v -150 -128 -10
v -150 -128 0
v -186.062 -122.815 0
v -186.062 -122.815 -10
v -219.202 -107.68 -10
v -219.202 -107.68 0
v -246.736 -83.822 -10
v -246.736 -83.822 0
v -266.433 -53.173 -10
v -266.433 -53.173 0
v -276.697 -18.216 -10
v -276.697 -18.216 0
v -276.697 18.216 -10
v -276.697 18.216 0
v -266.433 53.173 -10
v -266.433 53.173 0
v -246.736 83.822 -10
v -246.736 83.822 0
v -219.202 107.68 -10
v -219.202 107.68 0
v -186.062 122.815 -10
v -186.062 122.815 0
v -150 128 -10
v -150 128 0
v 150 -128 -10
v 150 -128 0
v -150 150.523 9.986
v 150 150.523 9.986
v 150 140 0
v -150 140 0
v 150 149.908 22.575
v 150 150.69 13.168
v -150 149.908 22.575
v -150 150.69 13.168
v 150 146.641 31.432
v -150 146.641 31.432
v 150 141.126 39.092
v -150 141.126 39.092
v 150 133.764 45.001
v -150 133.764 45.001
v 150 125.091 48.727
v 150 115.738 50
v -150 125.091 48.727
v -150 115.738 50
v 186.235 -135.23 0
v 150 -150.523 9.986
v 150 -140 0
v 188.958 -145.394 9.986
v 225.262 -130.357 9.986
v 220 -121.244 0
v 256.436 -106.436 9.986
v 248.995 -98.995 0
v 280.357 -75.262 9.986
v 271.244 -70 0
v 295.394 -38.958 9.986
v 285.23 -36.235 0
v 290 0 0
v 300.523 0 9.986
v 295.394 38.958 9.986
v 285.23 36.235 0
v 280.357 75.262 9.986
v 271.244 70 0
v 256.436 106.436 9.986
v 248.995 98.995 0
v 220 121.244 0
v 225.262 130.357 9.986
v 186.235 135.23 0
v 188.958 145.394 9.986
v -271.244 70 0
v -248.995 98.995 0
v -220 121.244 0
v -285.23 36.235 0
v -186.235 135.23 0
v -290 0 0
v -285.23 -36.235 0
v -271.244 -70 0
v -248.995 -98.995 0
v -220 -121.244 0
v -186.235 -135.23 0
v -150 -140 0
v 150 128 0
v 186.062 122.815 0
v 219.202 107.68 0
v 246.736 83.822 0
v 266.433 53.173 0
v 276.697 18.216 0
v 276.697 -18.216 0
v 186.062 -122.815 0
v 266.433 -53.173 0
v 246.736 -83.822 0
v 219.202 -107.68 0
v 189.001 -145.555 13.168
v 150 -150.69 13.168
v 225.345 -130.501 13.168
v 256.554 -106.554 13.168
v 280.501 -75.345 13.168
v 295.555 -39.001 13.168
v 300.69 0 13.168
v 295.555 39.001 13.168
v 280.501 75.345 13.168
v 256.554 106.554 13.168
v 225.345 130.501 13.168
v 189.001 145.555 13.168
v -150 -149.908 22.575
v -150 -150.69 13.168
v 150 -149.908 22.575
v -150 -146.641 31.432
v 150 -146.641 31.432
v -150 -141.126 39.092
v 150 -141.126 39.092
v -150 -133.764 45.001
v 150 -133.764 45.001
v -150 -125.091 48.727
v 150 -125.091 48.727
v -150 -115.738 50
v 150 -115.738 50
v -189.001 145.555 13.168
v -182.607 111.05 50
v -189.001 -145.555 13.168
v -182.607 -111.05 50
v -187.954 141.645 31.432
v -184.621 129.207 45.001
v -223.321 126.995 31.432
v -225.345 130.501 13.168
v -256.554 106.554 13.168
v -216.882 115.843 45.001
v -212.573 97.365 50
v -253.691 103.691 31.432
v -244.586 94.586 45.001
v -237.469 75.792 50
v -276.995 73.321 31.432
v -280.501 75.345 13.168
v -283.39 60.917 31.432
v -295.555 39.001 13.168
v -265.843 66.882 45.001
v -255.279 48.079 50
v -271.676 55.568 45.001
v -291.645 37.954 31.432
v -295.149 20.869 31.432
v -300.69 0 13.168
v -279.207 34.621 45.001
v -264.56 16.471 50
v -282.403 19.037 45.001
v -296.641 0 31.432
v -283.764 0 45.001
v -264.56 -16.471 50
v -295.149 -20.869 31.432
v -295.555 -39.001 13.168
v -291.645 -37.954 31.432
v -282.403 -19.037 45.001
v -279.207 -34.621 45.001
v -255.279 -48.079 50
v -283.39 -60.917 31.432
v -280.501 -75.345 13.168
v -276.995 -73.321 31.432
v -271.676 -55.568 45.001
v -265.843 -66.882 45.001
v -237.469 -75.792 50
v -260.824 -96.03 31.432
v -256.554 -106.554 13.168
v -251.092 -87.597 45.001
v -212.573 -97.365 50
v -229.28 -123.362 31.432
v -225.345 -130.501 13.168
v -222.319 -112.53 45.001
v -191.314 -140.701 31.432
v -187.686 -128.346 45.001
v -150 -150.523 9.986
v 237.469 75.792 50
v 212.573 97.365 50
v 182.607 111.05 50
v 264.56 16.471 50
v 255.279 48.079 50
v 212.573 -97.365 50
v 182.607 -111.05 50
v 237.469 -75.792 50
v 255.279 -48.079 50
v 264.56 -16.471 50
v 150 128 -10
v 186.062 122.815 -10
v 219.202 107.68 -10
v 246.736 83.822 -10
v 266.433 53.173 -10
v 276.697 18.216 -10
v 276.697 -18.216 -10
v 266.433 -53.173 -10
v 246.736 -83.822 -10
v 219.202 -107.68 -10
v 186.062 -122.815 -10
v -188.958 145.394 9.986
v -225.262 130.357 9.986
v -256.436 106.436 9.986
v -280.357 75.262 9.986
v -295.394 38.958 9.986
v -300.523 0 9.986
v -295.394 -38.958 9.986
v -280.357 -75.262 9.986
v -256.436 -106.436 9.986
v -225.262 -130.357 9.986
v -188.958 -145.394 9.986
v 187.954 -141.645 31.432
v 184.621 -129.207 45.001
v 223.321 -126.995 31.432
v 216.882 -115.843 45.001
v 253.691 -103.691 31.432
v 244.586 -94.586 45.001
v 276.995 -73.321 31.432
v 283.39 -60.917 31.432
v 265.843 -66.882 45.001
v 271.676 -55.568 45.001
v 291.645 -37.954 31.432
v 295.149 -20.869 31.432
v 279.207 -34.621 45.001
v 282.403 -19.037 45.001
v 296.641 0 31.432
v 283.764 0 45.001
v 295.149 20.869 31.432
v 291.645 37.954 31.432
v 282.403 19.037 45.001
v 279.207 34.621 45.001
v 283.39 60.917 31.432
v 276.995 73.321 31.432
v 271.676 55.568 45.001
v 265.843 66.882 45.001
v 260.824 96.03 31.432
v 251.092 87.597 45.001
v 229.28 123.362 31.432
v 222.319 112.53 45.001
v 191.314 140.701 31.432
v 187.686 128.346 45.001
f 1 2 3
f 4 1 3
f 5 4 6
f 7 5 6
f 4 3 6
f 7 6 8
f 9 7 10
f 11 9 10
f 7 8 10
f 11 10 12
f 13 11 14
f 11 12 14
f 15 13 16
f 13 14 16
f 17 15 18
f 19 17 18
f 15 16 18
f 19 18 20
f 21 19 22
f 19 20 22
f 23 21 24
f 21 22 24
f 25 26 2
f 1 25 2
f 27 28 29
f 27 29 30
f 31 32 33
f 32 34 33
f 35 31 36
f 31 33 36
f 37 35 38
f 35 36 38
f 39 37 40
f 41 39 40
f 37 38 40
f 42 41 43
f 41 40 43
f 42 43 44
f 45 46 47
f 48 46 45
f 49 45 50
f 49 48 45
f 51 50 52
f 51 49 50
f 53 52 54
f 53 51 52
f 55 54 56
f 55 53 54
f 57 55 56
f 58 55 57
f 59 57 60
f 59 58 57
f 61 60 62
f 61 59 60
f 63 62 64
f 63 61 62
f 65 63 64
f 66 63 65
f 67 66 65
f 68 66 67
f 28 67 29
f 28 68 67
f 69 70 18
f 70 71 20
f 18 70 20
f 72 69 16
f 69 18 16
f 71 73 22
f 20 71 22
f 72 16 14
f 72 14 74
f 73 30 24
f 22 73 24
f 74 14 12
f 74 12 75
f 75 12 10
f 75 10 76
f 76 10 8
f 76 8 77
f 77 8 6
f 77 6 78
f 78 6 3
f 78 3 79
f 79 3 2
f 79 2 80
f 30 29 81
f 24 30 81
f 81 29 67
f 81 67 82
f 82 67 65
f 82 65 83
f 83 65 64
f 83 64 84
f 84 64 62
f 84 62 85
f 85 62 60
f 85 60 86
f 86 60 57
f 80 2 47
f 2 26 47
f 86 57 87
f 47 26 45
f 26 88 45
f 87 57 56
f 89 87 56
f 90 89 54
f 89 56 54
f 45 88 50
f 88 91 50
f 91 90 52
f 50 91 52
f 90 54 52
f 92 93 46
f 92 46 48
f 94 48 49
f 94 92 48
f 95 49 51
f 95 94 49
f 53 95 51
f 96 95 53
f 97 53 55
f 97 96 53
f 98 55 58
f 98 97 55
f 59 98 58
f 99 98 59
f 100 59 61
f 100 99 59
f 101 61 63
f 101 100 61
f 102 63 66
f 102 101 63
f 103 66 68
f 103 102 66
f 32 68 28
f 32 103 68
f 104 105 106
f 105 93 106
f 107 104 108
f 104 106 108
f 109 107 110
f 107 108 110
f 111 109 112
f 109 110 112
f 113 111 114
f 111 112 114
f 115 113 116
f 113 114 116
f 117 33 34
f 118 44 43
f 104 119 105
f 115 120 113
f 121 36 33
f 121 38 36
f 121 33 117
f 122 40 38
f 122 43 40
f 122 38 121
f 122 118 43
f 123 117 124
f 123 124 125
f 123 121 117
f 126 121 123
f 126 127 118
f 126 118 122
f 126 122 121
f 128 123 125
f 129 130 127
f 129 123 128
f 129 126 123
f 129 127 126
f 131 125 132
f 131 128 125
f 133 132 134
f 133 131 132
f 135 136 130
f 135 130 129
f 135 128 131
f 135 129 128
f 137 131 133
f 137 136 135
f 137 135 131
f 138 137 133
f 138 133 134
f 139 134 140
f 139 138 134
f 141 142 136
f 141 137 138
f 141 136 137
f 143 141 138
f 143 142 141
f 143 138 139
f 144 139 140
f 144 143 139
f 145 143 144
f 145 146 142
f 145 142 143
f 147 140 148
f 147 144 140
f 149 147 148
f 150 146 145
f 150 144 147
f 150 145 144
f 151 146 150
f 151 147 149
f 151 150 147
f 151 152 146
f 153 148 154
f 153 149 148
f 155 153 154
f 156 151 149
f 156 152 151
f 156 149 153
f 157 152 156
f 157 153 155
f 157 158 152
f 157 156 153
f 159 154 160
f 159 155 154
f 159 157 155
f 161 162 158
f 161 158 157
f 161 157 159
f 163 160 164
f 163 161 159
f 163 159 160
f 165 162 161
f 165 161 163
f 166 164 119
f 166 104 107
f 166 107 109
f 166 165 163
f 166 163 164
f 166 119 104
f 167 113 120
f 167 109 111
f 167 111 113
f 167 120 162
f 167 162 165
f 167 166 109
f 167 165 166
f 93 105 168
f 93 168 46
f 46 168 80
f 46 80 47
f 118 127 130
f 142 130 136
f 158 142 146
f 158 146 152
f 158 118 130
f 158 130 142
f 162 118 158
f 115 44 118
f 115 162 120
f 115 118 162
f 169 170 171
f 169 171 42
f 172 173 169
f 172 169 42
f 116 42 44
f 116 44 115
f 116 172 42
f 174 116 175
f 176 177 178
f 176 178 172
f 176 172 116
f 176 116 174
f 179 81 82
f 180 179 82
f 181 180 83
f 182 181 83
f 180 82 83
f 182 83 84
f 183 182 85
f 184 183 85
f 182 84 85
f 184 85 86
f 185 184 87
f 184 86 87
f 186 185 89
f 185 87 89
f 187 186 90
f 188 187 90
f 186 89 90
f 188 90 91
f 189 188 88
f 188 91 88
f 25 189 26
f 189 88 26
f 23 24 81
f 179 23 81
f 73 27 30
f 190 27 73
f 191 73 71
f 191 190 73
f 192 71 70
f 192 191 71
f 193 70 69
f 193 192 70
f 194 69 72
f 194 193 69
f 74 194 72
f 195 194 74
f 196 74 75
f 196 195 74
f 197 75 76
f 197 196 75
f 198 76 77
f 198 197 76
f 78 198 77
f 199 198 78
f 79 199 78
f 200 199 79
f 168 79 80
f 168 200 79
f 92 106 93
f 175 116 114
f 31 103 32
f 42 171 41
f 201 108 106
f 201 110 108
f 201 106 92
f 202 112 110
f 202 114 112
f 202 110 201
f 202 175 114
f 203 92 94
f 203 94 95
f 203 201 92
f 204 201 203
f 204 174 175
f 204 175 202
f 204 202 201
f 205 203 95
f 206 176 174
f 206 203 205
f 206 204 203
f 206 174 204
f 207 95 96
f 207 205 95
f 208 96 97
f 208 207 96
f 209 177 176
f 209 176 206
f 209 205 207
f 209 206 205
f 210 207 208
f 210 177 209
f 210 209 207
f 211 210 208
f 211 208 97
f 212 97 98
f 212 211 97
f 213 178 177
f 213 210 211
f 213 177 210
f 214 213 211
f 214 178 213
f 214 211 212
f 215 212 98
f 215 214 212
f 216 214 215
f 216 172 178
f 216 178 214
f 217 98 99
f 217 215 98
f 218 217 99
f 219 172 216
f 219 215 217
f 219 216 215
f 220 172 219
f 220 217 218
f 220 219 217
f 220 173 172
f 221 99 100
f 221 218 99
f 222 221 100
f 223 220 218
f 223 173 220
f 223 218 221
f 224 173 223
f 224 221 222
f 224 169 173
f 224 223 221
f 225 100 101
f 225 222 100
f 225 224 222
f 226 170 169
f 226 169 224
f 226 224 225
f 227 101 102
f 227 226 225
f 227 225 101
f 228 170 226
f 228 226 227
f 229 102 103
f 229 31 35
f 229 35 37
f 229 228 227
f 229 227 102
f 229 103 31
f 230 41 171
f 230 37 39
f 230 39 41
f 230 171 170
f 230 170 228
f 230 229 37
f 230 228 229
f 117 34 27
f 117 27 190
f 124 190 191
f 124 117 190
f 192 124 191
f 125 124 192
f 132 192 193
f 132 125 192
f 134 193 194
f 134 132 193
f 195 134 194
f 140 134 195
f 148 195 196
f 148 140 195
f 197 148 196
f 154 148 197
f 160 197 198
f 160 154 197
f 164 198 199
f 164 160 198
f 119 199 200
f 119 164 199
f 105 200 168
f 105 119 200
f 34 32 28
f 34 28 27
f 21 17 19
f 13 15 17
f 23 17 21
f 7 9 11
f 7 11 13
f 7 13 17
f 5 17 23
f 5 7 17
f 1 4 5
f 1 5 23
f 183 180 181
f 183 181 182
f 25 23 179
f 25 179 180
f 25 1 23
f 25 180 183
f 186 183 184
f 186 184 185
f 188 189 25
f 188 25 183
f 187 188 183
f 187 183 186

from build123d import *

# Parameters (mm, degrees)
F1_DEPTH = 50
F1_TAPER = -3
F2_R     = 35
F3_SIZE  = 10
F5_DEPTH = 10


with BuildPart() as f1:
    # F0 (on Top) → F1 (new body)
    with BuildSketch(Plane.XY):
        with BuildLine():
            ThreePointArc((150, -150), (300, 0), (150, 150))
            Line((150, 150), (-150, 150))
            ThreePointArc((-150, 150), (-300, 0), (-150, -150))
            Line((-150, -150), (150, -150))
        make_face()
    extrude(amount=F1_DEPTH, taper=F1_TAPER)

    # F2
    f2_edges = [f1.edges().sort_by_distance(p)[0] for p in [
        (-302.620389, 0, 50),
        (0, -152.620389, 50),
        (302.620389, 0, 50),
        (0, 152.620389, 50),
    ]]
    fillet(f2_edges, radius=F2_R)

    # F3
    f3_edges = [f1.edges().sort_by_distance(p)[0] for p in [
        (-300, 0, 0),
        (0, -150, 0),
        (300, 0, 0),
        (0, 150, 0),
    ]]
    chamfer(f3_edges, length=F3_SIZE)

    # F4 (on face) → F5 (join)
    with BuildSketch(Plane(origin=(0, 0, 0), x_dir=(1, 0, 0), z_dir=(0, 0, -1))):
        with BuildLine():
            Line((150, 128), (-150, 128))
            ThreePointArc((-150, 128), (-278, 0), (-150, -128))
            Line((-150, -128), (150, -128))
            ThreePointArc((150, -128), (278, 0), (150, 128))
        make_face()
    extrude(amount=F5_DEPTH)


solid = f1.part
